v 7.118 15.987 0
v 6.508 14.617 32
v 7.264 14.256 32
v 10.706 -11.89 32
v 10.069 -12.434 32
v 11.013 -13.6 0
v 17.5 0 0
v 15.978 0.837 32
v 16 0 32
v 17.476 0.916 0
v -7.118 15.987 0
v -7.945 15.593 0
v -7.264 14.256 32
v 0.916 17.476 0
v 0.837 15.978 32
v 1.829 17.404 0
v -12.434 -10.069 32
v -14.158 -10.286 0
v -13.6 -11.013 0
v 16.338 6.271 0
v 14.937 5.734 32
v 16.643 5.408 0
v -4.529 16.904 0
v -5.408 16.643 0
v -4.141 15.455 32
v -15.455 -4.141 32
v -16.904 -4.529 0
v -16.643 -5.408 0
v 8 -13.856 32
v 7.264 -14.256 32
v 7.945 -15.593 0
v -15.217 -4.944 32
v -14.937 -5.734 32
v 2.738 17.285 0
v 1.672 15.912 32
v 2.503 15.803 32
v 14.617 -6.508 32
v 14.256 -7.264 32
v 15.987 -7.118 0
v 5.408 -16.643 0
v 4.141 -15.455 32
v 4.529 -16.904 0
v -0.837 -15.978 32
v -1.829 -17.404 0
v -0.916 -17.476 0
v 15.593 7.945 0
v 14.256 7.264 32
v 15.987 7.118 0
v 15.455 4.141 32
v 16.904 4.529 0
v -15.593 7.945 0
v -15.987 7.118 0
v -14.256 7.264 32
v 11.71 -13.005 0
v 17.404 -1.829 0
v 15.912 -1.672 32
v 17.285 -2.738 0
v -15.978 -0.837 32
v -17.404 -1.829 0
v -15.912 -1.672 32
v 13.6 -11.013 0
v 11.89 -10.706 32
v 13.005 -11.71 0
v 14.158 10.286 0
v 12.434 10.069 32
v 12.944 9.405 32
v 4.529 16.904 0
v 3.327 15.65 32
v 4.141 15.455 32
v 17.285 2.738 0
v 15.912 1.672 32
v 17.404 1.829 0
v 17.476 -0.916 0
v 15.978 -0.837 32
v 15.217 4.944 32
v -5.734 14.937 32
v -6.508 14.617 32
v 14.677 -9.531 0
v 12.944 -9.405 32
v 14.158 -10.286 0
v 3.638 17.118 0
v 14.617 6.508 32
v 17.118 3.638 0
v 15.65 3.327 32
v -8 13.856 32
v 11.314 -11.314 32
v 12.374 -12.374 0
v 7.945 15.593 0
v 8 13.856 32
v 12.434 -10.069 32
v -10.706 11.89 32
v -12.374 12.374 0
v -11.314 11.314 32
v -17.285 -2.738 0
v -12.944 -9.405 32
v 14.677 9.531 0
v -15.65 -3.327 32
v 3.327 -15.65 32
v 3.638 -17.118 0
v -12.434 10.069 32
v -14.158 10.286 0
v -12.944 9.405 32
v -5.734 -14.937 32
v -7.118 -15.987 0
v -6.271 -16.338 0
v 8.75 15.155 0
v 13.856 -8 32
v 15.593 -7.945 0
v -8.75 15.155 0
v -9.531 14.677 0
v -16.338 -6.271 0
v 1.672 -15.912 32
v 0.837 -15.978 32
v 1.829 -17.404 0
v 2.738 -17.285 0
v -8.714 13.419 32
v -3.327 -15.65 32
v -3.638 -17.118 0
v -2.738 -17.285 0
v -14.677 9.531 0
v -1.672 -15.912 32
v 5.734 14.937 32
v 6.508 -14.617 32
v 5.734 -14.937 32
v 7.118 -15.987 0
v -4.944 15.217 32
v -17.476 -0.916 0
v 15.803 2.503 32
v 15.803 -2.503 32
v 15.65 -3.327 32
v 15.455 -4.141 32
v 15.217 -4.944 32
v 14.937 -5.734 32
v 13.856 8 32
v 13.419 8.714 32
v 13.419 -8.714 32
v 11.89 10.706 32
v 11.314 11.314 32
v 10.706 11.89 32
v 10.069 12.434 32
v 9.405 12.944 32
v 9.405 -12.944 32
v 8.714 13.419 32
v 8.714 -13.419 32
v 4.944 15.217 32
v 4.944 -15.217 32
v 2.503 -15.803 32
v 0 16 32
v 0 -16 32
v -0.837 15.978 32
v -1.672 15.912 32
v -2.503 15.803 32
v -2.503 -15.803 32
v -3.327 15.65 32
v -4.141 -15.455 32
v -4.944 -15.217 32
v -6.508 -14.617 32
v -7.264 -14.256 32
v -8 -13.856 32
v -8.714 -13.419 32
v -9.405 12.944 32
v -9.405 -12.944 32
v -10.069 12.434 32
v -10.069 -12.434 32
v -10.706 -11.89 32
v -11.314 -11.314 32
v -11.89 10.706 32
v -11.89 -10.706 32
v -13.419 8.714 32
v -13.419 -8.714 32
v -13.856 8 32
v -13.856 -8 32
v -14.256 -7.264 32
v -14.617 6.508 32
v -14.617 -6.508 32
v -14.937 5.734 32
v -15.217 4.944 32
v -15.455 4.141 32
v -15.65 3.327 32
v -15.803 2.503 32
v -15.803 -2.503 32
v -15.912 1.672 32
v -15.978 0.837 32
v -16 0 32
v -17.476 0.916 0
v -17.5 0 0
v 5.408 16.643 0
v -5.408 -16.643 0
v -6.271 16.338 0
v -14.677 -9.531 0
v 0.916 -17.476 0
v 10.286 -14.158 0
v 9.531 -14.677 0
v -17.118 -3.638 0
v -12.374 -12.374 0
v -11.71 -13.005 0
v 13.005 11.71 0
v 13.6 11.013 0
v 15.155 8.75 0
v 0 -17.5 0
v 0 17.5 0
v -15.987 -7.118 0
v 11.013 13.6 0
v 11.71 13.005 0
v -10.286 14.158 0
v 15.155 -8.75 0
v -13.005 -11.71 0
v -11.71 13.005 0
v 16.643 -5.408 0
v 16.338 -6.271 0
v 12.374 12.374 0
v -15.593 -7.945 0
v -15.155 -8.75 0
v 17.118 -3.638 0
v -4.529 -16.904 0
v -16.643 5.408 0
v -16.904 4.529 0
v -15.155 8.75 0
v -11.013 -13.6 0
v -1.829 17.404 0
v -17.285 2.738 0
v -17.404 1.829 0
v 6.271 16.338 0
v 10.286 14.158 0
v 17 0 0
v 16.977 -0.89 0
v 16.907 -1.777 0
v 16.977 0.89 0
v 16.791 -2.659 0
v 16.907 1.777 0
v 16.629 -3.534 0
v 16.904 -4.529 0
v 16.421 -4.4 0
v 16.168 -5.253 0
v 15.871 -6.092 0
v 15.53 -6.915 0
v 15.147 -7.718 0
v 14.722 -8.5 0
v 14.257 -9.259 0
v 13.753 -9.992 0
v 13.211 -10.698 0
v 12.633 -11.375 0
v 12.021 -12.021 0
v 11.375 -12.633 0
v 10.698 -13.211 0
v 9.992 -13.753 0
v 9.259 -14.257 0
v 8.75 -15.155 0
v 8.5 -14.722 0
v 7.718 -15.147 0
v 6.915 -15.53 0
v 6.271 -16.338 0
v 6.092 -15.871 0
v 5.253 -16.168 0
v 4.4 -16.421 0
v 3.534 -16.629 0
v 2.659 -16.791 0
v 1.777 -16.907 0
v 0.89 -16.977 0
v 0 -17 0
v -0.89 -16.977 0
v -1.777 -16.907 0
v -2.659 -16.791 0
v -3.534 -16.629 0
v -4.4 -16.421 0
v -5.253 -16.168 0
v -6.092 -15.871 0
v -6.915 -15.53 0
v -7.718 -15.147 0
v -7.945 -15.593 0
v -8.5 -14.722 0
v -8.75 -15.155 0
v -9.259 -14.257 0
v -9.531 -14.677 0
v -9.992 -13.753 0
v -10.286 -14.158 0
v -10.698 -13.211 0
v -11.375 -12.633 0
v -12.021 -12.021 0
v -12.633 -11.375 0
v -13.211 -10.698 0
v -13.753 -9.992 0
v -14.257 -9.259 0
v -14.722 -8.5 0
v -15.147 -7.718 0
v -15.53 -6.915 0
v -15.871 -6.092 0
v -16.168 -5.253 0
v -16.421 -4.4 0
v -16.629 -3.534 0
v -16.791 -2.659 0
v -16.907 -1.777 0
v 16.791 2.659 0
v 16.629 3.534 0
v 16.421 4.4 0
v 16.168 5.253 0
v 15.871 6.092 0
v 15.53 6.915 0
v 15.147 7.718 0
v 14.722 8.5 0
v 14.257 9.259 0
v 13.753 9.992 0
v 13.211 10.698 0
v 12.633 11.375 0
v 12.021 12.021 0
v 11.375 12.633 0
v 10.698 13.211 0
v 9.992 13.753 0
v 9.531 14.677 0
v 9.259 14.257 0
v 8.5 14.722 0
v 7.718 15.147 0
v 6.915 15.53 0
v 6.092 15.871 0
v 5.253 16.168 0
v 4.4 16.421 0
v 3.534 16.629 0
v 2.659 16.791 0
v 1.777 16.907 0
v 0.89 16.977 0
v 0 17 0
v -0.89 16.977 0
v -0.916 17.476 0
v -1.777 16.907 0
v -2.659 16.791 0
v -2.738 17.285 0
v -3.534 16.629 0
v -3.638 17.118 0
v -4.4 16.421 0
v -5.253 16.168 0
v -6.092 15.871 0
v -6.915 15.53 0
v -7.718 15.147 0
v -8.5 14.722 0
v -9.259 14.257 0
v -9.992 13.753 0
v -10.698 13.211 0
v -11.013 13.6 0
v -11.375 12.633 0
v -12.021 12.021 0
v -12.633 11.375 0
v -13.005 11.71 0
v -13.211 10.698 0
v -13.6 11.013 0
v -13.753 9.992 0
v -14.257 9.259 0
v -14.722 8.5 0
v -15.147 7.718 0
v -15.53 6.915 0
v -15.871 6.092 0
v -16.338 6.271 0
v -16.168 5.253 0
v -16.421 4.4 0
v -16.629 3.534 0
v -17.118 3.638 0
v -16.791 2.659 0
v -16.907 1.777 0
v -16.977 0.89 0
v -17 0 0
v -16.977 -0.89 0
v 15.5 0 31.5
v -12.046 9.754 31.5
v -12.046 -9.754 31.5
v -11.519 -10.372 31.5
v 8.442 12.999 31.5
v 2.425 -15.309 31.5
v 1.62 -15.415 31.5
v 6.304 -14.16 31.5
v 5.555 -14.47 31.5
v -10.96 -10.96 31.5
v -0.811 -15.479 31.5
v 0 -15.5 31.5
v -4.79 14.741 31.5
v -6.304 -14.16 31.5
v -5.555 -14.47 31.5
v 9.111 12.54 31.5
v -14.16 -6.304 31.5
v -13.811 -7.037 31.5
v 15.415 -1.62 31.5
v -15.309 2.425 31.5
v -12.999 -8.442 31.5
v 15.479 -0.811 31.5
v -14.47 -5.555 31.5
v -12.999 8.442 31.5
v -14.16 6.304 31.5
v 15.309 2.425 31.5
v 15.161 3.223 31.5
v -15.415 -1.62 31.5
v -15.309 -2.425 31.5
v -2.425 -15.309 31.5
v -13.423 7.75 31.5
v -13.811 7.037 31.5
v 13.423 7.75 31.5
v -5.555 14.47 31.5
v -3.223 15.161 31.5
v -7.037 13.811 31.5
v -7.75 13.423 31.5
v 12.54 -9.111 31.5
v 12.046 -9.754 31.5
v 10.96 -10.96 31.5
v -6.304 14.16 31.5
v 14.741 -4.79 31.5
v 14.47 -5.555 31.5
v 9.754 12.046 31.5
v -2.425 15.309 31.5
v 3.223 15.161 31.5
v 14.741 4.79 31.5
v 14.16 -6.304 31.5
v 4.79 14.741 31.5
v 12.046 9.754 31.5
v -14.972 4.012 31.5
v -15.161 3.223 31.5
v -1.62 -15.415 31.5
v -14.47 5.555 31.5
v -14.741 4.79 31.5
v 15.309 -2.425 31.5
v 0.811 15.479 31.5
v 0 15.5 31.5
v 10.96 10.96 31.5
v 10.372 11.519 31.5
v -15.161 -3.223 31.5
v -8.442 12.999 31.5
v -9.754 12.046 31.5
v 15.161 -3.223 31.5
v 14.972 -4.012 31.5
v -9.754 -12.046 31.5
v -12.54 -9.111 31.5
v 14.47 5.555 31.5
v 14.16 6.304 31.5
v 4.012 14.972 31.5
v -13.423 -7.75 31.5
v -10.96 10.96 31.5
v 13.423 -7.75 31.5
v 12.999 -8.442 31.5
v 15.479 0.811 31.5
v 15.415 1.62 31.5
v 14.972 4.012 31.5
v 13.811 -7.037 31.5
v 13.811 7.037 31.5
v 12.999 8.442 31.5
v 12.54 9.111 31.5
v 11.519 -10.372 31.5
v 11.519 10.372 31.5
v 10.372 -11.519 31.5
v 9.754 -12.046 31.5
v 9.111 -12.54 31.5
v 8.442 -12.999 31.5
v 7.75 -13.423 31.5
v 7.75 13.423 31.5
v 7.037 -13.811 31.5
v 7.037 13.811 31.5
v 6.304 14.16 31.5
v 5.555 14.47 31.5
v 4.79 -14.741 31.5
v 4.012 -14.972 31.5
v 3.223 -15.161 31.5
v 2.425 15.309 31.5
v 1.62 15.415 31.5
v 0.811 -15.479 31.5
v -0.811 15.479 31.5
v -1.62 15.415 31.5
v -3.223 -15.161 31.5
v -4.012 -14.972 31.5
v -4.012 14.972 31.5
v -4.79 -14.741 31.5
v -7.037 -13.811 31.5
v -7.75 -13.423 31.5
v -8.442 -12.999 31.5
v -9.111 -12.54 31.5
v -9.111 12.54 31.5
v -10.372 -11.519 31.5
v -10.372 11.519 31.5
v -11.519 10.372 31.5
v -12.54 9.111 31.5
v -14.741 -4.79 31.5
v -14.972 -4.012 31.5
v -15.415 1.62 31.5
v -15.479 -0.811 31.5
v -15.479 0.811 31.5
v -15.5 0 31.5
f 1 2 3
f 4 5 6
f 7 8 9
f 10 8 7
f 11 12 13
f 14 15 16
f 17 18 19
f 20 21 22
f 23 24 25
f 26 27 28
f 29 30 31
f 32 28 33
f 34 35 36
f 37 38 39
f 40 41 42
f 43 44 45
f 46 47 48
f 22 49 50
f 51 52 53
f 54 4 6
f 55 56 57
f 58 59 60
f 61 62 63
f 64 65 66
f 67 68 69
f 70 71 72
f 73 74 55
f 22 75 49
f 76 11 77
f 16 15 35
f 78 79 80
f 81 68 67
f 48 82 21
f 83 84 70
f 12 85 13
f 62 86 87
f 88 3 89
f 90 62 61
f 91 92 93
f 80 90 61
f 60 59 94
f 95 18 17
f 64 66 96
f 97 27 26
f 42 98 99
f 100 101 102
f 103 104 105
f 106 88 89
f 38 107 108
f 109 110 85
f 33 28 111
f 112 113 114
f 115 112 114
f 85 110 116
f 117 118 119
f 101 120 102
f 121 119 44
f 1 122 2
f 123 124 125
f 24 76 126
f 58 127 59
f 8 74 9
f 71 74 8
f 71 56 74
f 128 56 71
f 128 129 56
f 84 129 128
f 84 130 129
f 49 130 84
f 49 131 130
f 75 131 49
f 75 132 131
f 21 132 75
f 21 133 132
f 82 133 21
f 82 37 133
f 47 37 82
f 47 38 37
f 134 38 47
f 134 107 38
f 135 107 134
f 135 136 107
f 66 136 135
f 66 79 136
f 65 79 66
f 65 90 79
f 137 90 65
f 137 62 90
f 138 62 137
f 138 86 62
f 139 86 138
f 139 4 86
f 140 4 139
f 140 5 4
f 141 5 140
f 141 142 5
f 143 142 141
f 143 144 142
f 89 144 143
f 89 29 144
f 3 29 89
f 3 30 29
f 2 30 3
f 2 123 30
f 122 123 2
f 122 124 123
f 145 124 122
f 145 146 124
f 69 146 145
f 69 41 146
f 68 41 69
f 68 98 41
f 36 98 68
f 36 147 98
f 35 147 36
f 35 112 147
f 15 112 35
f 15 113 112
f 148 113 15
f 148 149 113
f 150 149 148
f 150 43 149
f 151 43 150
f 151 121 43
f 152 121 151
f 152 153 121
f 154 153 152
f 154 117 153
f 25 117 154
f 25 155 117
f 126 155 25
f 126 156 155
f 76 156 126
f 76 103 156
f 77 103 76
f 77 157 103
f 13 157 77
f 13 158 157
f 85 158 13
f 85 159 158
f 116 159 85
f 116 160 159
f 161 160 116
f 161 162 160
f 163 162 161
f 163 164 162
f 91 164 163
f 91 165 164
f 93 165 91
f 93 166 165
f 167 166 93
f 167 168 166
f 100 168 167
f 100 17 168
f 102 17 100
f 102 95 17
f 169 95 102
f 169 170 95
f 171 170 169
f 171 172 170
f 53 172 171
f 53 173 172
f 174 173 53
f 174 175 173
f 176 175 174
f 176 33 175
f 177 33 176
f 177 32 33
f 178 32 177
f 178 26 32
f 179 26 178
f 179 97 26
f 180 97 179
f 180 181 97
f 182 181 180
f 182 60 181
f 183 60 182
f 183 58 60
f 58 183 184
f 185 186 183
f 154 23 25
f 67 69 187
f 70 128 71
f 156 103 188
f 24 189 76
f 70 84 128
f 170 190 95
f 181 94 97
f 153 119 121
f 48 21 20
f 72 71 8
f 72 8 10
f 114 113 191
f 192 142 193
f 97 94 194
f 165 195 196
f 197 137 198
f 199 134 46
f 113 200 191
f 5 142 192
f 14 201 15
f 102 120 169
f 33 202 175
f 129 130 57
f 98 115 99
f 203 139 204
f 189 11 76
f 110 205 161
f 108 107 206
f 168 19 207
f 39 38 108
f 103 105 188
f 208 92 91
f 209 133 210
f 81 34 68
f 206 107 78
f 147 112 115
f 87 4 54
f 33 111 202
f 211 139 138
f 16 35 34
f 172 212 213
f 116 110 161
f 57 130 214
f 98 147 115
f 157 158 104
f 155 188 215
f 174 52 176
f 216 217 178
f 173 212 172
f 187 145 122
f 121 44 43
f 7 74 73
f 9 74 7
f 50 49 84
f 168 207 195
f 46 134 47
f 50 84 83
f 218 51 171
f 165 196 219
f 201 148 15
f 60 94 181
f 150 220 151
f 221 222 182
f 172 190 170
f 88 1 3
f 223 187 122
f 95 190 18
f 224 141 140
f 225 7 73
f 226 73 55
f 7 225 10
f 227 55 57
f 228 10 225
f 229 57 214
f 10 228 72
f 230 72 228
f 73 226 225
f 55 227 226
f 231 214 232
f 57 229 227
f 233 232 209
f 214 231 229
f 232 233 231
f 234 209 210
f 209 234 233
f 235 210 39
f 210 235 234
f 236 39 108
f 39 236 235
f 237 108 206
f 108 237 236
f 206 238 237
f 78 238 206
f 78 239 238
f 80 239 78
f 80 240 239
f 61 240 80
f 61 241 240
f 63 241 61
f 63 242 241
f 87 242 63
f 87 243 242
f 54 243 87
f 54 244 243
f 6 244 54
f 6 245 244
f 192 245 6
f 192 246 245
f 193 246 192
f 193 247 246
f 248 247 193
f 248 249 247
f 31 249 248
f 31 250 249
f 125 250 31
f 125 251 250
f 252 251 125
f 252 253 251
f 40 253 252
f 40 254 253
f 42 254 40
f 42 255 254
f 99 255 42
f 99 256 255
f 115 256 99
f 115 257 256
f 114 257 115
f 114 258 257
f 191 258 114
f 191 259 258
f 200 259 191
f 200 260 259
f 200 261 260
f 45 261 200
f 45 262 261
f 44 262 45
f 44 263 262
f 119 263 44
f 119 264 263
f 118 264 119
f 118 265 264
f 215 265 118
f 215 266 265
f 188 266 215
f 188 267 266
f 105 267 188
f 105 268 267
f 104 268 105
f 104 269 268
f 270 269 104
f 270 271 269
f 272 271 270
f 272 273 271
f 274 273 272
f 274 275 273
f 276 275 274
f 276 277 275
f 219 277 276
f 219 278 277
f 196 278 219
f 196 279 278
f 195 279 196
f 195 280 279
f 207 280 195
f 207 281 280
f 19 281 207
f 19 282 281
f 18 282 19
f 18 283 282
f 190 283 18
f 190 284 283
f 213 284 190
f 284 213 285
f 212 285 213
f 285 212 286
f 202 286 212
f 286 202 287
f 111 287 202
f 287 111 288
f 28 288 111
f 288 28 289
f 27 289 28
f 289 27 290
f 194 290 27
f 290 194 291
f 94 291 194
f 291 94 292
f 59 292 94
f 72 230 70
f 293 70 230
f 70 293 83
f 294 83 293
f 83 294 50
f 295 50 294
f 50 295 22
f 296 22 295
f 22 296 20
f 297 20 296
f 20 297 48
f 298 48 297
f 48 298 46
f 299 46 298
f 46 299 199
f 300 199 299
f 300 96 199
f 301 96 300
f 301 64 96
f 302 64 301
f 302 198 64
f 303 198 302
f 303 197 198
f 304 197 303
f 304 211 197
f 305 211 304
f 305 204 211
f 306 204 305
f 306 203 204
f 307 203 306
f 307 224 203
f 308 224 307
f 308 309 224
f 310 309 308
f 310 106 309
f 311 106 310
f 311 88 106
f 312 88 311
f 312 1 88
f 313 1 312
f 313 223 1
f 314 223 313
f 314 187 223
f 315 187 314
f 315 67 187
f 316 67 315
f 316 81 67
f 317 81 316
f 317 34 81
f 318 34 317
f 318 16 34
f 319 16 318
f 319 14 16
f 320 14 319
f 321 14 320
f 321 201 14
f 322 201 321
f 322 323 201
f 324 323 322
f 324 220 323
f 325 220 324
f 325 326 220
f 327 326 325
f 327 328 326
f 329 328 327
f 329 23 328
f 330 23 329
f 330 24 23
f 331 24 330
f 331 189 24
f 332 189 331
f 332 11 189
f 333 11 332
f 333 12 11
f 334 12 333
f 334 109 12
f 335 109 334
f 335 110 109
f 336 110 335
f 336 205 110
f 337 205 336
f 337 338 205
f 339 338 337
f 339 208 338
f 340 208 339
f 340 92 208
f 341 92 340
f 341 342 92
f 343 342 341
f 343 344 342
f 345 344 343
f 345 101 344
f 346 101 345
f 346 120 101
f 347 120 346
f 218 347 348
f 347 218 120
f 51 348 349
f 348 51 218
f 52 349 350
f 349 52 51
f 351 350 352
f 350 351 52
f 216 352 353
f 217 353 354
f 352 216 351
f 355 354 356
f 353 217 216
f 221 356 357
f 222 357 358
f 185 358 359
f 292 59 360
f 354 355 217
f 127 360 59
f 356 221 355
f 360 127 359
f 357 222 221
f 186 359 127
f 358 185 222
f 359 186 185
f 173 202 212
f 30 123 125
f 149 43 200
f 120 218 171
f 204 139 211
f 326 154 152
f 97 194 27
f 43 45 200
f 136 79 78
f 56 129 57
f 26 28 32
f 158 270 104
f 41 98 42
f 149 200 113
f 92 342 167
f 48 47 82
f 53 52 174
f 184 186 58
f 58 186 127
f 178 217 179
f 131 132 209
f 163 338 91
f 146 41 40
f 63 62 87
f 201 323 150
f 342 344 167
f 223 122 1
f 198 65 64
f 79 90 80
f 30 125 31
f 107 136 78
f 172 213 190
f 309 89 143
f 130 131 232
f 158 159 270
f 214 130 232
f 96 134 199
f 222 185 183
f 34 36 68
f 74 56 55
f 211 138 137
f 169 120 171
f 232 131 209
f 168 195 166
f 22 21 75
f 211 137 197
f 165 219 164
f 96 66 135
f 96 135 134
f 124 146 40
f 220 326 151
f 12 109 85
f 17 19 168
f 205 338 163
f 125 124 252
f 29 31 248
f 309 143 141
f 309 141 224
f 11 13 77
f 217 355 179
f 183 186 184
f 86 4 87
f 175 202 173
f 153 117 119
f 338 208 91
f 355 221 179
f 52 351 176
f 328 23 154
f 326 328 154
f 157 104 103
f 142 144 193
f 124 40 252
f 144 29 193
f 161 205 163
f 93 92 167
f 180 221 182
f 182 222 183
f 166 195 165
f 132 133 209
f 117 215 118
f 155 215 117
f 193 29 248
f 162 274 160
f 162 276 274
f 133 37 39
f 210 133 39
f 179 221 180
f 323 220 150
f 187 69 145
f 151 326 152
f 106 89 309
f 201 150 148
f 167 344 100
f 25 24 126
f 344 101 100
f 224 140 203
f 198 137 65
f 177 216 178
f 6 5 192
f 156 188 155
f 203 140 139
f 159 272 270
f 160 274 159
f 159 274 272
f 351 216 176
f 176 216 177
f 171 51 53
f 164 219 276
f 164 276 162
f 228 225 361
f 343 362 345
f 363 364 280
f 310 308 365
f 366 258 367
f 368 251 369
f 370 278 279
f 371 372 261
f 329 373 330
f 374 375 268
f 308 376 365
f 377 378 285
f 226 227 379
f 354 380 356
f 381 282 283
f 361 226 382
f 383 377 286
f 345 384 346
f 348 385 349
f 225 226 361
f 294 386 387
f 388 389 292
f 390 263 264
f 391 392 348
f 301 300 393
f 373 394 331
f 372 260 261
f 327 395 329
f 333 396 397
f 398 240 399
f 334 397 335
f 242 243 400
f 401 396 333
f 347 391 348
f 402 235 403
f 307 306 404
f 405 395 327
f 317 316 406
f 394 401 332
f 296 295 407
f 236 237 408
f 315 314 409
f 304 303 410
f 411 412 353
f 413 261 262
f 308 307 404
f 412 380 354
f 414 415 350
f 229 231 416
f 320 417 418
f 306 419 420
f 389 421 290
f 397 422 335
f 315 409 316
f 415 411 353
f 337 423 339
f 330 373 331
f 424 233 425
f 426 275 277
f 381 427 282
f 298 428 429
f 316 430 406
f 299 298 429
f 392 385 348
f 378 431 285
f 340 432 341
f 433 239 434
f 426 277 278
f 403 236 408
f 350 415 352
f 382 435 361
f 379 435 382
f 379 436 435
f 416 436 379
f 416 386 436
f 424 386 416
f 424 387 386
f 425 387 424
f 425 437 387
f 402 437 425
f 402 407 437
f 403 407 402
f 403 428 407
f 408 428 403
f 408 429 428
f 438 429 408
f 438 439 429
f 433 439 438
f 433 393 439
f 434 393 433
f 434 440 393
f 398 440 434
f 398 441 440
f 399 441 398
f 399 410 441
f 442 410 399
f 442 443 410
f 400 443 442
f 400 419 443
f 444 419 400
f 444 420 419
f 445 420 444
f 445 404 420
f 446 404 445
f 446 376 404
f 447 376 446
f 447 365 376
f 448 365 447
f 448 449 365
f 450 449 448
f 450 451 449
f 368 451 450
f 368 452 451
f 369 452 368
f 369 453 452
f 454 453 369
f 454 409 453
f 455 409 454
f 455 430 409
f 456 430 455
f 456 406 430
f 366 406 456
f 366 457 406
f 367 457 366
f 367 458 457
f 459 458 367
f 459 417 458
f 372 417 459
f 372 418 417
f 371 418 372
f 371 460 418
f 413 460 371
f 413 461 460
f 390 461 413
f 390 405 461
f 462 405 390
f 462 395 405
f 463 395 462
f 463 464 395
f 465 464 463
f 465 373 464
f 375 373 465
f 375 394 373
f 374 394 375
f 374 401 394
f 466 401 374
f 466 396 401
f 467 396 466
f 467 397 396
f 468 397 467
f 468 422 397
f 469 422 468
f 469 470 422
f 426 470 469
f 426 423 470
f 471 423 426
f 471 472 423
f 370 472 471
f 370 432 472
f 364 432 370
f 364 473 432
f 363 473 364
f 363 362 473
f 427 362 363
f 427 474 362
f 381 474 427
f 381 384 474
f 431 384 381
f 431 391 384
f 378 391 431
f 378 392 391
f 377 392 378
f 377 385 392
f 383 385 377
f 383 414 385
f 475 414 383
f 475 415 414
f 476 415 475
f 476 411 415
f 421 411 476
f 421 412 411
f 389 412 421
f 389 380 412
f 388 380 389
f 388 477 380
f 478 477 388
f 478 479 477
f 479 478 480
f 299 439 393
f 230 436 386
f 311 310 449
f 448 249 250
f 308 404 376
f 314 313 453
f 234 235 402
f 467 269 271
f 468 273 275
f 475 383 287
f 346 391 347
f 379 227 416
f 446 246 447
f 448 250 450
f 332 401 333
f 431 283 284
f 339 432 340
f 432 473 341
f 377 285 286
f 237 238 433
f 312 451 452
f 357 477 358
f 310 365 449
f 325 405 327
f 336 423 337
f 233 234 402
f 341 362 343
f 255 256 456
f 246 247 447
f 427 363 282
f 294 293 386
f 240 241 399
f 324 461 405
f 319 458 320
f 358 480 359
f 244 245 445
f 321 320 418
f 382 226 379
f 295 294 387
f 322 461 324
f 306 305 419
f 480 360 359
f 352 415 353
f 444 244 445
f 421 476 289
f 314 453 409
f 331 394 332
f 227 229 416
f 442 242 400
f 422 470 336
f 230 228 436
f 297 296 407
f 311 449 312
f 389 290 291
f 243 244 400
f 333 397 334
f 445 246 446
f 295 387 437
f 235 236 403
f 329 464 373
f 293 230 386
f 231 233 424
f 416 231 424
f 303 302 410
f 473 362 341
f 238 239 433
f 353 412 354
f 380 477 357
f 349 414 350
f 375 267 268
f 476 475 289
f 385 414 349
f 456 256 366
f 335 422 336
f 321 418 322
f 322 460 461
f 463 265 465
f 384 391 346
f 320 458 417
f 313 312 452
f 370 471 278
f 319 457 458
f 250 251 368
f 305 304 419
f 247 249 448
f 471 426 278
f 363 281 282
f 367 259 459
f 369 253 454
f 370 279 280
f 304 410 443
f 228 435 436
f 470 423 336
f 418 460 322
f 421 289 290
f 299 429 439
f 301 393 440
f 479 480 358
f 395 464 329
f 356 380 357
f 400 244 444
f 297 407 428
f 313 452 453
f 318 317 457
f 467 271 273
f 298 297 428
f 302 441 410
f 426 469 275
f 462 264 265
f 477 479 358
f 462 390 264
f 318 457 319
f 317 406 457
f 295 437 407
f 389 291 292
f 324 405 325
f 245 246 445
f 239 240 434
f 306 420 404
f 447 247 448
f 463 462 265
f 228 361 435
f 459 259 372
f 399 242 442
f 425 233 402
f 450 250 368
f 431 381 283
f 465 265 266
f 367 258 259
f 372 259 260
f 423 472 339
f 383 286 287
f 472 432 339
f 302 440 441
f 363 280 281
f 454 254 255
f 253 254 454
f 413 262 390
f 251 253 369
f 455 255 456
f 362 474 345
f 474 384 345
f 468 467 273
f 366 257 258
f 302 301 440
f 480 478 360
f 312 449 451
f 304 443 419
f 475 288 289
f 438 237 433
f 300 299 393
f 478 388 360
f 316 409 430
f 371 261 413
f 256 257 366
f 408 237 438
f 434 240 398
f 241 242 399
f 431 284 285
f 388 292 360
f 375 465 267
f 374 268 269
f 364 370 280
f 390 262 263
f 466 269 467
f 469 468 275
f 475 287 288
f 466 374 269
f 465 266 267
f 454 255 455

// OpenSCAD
module diffuser(ring_dia=34, wall_thick=0.5, height=32, taper=3) {
  difference() {
    cylinder(d1=ring_dia+wall_thick*2, d2=ring_dia+wall_thick*2-taper, h=height, $fa=3, $fs=0.5);
    cylinder(d1=ring_dia, d2=ring_dia-taper, h=height-wall_thick, $fa=3, $fs=0.5);
  }
}

diffuser();
